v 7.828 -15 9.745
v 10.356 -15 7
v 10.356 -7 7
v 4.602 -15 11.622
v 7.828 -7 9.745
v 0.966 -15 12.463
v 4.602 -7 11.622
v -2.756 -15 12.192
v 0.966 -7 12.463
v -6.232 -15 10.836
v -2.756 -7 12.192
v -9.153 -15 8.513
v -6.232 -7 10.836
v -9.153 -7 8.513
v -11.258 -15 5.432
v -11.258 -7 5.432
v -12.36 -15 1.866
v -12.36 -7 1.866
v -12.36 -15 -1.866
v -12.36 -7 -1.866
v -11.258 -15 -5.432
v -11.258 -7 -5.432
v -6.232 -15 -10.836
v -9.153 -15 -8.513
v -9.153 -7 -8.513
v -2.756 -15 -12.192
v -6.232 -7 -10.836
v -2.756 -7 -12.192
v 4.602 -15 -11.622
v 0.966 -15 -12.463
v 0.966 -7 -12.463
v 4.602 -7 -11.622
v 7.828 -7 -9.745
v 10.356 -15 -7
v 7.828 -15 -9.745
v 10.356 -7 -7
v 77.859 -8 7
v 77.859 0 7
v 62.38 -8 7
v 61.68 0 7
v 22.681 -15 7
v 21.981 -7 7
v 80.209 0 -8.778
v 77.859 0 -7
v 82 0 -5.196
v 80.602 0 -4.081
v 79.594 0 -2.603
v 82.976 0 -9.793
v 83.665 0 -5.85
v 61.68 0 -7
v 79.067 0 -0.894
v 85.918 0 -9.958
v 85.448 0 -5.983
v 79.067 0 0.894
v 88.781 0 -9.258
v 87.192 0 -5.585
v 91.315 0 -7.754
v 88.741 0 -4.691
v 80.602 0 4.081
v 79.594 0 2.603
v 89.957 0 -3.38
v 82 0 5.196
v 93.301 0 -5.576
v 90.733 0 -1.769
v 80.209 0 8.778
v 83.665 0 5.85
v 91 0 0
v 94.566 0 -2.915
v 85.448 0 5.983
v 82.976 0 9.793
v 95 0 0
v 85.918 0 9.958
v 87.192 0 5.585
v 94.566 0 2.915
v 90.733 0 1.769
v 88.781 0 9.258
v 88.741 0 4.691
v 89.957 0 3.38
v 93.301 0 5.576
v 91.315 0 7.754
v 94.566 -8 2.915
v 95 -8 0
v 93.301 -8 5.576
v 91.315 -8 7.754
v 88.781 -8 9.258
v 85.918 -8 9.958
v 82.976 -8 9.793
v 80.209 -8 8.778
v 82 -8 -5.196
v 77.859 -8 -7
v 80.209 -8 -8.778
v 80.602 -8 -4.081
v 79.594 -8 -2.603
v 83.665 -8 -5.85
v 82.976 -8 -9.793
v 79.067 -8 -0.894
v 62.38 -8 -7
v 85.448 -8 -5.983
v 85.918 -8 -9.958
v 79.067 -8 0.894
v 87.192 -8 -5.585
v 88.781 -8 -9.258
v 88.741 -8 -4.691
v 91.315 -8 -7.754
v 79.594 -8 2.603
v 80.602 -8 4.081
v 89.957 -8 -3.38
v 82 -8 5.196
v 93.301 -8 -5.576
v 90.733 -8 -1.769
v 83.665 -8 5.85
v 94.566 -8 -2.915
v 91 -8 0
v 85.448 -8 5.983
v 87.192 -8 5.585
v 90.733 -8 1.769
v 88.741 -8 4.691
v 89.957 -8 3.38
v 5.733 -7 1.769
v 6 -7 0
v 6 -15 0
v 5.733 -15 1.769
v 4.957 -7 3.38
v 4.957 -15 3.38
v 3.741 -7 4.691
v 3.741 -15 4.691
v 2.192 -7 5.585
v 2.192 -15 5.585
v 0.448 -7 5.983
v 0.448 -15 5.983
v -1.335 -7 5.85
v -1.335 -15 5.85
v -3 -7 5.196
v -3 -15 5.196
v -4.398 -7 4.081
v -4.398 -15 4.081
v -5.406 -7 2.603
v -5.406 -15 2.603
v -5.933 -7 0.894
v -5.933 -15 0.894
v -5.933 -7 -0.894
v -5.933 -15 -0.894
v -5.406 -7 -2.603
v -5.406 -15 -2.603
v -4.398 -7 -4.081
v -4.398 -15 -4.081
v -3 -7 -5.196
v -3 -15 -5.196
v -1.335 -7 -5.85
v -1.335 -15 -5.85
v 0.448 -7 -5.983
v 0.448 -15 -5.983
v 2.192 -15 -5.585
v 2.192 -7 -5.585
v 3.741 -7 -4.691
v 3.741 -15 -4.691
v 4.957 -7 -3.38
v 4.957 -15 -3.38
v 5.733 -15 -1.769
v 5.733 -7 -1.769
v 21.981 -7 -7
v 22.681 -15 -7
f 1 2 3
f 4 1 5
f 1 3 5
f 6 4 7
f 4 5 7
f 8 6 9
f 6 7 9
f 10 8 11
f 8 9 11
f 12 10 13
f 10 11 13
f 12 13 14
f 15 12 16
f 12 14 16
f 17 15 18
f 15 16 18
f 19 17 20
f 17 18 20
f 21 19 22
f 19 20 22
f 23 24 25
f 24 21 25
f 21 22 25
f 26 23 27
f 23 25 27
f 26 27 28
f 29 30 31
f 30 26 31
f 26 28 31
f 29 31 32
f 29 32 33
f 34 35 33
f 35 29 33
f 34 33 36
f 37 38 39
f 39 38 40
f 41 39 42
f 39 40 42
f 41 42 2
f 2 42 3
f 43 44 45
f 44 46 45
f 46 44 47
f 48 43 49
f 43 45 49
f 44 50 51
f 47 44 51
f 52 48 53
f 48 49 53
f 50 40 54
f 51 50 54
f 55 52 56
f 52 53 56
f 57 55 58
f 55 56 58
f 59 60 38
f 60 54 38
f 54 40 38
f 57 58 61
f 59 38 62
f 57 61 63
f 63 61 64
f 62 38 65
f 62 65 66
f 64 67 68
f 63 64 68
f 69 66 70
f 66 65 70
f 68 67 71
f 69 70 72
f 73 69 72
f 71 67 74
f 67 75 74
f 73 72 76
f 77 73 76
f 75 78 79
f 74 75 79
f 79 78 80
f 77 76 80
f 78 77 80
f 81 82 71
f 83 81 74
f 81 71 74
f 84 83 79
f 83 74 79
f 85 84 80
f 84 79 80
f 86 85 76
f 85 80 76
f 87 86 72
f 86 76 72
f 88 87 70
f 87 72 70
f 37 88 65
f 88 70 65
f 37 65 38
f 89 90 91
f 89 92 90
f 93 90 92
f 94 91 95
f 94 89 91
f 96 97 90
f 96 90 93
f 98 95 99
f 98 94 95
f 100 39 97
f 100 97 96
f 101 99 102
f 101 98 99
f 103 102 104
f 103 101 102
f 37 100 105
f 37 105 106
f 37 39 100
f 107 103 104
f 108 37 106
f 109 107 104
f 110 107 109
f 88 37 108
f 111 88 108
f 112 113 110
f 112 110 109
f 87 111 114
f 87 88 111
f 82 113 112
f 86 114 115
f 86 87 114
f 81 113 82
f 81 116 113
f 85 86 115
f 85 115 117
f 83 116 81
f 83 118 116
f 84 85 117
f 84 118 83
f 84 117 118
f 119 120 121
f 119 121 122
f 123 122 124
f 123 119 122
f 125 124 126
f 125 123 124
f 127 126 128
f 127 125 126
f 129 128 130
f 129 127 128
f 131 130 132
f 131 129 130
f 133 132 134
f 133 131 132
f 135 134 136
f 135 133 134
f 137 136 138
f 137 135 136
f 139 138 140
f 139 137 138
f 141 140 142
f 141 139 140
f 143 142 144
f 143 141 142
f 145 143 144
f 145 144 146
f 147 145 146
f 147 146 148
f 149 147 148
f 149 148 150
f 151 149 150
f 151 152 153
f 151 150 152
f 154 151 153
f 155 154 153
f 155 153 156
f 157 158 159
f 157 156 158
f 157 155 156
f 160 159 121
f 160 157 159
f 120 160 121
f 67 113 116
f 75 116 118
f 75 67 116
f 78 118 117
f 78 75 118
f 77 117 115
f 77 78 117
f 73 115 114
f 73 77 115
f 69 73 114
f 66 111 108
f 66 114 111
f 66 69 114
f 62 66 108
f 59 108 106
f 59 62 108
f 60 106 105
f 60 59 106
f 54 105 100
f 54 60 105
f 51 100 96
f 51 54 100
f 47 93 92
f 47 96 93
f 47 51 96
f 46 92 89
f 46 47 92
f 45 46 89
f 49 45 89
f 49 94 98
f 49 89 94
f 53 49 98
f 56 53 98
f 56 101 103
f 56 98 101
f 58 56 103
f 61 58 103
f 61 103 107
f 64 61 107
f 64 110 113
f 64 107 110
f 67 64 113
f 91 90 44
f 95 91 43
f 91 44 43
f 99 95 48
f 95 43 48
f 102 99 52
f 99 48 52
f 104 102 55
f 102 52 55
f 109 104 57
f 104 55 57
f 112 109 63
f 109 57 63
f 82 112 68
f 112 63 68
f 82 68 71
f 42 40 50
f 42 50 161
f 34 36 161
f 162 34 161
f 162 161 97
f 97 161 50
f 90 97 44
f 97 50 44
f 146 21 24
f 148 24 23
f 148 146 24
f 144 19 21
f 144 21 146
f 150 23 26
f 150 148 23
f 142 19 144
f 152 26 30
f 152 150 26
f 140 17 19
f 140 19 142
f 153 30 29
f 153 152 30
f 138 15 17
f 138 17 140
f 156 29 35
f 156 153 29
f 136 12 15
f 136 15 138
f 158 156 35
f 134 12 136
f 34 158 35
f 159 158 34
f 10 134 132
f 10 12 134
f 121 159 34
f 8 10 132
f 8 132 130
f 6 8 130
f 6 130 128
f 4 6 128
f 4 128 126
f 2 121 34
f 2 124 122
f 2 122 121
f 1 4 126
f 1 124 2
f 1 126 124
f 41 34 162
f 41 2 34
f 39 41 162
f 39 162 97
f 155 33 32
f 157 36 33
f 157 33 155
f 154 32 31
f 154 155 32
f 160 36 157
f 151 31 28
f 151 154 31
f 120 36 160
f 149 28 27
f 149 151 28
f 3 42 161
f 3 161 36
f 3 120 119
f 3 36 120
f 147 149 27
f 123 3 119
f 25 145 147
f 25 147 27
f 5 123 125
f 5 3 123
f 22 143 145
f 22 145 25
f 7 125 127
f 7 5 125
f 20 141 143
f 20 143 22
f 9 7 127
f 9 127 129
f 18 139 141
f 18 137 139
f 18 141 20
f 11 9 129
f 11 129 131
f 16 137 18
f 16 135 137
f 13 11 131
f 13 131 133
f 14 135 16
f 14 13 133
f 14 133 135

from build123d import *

# Parameters (mm, degrees)
F0_R     = 6
F1_DEPTH = 20
F3_DEPTH = 12.5


with BuildPart() as f1:
    # F0 (on Front) → F1 (new body)
    with BuildSketch(Plane.XZ):
        with BuildLine():
            ThreePointArc((10.356158, -7), (11.952028, -3.660467), (12.5, 0))
            ThreePointArc((12.5, 0), (11.952028, 3.660467), (10.356158, 7))
            ThreePointArc((10.356158, 7), (-12.5, 0), (10.356158, -7))
        make_face()
        Circle(F0_R, mode=Mode.SUBTRACT)
        with BuildLine():
            ThreePointArc((10.356158, 7), (11.952028, 3.660467), (12.5, 0))
            ThreePointArc((12.5, 0), (11.952028, -3.660467), (10.356158, -7))
            Line((10.356158, -7), (77.858572, -7))
            ThreePointArc((77.858572, -7), (75, 0), (77.858572, 7))
            Line((77.858572, 7), (10.356158, 7))
        make_face()
        with BuildLine():
            ThreePointArc((95, 0), (88.78059, 9.257815), (77.858572, 7))
            ThreePointArc((77.858572, 7), (75, 0), (77.858572, -7))
            ThreePointArc((77.858572, -7), (88.78059, -9.257815), (95, 0))
        make_face()
        with Locations((85, 0)):
            Circle(F0_R, mode=Mode.SUBTRACT)
    extrude(amount=F1_DEPTH)

    # F2 (on Top) → F3 (intersect, symmetric)
    with BuildSketch(Plane.XY):
        Polygon((95, -8), (95, 0), (81.679874, 0), (61.679874, 0), (21.980901, -7), (-12.5, -7), (-12.5, -15), (22.68081, -15), (62.379783, -8), (85.50881, -8), align=None)
    extrude(amount=F3_DEPTH, both=True, mode=Mode.INTERSECT)


solid = f1.part
